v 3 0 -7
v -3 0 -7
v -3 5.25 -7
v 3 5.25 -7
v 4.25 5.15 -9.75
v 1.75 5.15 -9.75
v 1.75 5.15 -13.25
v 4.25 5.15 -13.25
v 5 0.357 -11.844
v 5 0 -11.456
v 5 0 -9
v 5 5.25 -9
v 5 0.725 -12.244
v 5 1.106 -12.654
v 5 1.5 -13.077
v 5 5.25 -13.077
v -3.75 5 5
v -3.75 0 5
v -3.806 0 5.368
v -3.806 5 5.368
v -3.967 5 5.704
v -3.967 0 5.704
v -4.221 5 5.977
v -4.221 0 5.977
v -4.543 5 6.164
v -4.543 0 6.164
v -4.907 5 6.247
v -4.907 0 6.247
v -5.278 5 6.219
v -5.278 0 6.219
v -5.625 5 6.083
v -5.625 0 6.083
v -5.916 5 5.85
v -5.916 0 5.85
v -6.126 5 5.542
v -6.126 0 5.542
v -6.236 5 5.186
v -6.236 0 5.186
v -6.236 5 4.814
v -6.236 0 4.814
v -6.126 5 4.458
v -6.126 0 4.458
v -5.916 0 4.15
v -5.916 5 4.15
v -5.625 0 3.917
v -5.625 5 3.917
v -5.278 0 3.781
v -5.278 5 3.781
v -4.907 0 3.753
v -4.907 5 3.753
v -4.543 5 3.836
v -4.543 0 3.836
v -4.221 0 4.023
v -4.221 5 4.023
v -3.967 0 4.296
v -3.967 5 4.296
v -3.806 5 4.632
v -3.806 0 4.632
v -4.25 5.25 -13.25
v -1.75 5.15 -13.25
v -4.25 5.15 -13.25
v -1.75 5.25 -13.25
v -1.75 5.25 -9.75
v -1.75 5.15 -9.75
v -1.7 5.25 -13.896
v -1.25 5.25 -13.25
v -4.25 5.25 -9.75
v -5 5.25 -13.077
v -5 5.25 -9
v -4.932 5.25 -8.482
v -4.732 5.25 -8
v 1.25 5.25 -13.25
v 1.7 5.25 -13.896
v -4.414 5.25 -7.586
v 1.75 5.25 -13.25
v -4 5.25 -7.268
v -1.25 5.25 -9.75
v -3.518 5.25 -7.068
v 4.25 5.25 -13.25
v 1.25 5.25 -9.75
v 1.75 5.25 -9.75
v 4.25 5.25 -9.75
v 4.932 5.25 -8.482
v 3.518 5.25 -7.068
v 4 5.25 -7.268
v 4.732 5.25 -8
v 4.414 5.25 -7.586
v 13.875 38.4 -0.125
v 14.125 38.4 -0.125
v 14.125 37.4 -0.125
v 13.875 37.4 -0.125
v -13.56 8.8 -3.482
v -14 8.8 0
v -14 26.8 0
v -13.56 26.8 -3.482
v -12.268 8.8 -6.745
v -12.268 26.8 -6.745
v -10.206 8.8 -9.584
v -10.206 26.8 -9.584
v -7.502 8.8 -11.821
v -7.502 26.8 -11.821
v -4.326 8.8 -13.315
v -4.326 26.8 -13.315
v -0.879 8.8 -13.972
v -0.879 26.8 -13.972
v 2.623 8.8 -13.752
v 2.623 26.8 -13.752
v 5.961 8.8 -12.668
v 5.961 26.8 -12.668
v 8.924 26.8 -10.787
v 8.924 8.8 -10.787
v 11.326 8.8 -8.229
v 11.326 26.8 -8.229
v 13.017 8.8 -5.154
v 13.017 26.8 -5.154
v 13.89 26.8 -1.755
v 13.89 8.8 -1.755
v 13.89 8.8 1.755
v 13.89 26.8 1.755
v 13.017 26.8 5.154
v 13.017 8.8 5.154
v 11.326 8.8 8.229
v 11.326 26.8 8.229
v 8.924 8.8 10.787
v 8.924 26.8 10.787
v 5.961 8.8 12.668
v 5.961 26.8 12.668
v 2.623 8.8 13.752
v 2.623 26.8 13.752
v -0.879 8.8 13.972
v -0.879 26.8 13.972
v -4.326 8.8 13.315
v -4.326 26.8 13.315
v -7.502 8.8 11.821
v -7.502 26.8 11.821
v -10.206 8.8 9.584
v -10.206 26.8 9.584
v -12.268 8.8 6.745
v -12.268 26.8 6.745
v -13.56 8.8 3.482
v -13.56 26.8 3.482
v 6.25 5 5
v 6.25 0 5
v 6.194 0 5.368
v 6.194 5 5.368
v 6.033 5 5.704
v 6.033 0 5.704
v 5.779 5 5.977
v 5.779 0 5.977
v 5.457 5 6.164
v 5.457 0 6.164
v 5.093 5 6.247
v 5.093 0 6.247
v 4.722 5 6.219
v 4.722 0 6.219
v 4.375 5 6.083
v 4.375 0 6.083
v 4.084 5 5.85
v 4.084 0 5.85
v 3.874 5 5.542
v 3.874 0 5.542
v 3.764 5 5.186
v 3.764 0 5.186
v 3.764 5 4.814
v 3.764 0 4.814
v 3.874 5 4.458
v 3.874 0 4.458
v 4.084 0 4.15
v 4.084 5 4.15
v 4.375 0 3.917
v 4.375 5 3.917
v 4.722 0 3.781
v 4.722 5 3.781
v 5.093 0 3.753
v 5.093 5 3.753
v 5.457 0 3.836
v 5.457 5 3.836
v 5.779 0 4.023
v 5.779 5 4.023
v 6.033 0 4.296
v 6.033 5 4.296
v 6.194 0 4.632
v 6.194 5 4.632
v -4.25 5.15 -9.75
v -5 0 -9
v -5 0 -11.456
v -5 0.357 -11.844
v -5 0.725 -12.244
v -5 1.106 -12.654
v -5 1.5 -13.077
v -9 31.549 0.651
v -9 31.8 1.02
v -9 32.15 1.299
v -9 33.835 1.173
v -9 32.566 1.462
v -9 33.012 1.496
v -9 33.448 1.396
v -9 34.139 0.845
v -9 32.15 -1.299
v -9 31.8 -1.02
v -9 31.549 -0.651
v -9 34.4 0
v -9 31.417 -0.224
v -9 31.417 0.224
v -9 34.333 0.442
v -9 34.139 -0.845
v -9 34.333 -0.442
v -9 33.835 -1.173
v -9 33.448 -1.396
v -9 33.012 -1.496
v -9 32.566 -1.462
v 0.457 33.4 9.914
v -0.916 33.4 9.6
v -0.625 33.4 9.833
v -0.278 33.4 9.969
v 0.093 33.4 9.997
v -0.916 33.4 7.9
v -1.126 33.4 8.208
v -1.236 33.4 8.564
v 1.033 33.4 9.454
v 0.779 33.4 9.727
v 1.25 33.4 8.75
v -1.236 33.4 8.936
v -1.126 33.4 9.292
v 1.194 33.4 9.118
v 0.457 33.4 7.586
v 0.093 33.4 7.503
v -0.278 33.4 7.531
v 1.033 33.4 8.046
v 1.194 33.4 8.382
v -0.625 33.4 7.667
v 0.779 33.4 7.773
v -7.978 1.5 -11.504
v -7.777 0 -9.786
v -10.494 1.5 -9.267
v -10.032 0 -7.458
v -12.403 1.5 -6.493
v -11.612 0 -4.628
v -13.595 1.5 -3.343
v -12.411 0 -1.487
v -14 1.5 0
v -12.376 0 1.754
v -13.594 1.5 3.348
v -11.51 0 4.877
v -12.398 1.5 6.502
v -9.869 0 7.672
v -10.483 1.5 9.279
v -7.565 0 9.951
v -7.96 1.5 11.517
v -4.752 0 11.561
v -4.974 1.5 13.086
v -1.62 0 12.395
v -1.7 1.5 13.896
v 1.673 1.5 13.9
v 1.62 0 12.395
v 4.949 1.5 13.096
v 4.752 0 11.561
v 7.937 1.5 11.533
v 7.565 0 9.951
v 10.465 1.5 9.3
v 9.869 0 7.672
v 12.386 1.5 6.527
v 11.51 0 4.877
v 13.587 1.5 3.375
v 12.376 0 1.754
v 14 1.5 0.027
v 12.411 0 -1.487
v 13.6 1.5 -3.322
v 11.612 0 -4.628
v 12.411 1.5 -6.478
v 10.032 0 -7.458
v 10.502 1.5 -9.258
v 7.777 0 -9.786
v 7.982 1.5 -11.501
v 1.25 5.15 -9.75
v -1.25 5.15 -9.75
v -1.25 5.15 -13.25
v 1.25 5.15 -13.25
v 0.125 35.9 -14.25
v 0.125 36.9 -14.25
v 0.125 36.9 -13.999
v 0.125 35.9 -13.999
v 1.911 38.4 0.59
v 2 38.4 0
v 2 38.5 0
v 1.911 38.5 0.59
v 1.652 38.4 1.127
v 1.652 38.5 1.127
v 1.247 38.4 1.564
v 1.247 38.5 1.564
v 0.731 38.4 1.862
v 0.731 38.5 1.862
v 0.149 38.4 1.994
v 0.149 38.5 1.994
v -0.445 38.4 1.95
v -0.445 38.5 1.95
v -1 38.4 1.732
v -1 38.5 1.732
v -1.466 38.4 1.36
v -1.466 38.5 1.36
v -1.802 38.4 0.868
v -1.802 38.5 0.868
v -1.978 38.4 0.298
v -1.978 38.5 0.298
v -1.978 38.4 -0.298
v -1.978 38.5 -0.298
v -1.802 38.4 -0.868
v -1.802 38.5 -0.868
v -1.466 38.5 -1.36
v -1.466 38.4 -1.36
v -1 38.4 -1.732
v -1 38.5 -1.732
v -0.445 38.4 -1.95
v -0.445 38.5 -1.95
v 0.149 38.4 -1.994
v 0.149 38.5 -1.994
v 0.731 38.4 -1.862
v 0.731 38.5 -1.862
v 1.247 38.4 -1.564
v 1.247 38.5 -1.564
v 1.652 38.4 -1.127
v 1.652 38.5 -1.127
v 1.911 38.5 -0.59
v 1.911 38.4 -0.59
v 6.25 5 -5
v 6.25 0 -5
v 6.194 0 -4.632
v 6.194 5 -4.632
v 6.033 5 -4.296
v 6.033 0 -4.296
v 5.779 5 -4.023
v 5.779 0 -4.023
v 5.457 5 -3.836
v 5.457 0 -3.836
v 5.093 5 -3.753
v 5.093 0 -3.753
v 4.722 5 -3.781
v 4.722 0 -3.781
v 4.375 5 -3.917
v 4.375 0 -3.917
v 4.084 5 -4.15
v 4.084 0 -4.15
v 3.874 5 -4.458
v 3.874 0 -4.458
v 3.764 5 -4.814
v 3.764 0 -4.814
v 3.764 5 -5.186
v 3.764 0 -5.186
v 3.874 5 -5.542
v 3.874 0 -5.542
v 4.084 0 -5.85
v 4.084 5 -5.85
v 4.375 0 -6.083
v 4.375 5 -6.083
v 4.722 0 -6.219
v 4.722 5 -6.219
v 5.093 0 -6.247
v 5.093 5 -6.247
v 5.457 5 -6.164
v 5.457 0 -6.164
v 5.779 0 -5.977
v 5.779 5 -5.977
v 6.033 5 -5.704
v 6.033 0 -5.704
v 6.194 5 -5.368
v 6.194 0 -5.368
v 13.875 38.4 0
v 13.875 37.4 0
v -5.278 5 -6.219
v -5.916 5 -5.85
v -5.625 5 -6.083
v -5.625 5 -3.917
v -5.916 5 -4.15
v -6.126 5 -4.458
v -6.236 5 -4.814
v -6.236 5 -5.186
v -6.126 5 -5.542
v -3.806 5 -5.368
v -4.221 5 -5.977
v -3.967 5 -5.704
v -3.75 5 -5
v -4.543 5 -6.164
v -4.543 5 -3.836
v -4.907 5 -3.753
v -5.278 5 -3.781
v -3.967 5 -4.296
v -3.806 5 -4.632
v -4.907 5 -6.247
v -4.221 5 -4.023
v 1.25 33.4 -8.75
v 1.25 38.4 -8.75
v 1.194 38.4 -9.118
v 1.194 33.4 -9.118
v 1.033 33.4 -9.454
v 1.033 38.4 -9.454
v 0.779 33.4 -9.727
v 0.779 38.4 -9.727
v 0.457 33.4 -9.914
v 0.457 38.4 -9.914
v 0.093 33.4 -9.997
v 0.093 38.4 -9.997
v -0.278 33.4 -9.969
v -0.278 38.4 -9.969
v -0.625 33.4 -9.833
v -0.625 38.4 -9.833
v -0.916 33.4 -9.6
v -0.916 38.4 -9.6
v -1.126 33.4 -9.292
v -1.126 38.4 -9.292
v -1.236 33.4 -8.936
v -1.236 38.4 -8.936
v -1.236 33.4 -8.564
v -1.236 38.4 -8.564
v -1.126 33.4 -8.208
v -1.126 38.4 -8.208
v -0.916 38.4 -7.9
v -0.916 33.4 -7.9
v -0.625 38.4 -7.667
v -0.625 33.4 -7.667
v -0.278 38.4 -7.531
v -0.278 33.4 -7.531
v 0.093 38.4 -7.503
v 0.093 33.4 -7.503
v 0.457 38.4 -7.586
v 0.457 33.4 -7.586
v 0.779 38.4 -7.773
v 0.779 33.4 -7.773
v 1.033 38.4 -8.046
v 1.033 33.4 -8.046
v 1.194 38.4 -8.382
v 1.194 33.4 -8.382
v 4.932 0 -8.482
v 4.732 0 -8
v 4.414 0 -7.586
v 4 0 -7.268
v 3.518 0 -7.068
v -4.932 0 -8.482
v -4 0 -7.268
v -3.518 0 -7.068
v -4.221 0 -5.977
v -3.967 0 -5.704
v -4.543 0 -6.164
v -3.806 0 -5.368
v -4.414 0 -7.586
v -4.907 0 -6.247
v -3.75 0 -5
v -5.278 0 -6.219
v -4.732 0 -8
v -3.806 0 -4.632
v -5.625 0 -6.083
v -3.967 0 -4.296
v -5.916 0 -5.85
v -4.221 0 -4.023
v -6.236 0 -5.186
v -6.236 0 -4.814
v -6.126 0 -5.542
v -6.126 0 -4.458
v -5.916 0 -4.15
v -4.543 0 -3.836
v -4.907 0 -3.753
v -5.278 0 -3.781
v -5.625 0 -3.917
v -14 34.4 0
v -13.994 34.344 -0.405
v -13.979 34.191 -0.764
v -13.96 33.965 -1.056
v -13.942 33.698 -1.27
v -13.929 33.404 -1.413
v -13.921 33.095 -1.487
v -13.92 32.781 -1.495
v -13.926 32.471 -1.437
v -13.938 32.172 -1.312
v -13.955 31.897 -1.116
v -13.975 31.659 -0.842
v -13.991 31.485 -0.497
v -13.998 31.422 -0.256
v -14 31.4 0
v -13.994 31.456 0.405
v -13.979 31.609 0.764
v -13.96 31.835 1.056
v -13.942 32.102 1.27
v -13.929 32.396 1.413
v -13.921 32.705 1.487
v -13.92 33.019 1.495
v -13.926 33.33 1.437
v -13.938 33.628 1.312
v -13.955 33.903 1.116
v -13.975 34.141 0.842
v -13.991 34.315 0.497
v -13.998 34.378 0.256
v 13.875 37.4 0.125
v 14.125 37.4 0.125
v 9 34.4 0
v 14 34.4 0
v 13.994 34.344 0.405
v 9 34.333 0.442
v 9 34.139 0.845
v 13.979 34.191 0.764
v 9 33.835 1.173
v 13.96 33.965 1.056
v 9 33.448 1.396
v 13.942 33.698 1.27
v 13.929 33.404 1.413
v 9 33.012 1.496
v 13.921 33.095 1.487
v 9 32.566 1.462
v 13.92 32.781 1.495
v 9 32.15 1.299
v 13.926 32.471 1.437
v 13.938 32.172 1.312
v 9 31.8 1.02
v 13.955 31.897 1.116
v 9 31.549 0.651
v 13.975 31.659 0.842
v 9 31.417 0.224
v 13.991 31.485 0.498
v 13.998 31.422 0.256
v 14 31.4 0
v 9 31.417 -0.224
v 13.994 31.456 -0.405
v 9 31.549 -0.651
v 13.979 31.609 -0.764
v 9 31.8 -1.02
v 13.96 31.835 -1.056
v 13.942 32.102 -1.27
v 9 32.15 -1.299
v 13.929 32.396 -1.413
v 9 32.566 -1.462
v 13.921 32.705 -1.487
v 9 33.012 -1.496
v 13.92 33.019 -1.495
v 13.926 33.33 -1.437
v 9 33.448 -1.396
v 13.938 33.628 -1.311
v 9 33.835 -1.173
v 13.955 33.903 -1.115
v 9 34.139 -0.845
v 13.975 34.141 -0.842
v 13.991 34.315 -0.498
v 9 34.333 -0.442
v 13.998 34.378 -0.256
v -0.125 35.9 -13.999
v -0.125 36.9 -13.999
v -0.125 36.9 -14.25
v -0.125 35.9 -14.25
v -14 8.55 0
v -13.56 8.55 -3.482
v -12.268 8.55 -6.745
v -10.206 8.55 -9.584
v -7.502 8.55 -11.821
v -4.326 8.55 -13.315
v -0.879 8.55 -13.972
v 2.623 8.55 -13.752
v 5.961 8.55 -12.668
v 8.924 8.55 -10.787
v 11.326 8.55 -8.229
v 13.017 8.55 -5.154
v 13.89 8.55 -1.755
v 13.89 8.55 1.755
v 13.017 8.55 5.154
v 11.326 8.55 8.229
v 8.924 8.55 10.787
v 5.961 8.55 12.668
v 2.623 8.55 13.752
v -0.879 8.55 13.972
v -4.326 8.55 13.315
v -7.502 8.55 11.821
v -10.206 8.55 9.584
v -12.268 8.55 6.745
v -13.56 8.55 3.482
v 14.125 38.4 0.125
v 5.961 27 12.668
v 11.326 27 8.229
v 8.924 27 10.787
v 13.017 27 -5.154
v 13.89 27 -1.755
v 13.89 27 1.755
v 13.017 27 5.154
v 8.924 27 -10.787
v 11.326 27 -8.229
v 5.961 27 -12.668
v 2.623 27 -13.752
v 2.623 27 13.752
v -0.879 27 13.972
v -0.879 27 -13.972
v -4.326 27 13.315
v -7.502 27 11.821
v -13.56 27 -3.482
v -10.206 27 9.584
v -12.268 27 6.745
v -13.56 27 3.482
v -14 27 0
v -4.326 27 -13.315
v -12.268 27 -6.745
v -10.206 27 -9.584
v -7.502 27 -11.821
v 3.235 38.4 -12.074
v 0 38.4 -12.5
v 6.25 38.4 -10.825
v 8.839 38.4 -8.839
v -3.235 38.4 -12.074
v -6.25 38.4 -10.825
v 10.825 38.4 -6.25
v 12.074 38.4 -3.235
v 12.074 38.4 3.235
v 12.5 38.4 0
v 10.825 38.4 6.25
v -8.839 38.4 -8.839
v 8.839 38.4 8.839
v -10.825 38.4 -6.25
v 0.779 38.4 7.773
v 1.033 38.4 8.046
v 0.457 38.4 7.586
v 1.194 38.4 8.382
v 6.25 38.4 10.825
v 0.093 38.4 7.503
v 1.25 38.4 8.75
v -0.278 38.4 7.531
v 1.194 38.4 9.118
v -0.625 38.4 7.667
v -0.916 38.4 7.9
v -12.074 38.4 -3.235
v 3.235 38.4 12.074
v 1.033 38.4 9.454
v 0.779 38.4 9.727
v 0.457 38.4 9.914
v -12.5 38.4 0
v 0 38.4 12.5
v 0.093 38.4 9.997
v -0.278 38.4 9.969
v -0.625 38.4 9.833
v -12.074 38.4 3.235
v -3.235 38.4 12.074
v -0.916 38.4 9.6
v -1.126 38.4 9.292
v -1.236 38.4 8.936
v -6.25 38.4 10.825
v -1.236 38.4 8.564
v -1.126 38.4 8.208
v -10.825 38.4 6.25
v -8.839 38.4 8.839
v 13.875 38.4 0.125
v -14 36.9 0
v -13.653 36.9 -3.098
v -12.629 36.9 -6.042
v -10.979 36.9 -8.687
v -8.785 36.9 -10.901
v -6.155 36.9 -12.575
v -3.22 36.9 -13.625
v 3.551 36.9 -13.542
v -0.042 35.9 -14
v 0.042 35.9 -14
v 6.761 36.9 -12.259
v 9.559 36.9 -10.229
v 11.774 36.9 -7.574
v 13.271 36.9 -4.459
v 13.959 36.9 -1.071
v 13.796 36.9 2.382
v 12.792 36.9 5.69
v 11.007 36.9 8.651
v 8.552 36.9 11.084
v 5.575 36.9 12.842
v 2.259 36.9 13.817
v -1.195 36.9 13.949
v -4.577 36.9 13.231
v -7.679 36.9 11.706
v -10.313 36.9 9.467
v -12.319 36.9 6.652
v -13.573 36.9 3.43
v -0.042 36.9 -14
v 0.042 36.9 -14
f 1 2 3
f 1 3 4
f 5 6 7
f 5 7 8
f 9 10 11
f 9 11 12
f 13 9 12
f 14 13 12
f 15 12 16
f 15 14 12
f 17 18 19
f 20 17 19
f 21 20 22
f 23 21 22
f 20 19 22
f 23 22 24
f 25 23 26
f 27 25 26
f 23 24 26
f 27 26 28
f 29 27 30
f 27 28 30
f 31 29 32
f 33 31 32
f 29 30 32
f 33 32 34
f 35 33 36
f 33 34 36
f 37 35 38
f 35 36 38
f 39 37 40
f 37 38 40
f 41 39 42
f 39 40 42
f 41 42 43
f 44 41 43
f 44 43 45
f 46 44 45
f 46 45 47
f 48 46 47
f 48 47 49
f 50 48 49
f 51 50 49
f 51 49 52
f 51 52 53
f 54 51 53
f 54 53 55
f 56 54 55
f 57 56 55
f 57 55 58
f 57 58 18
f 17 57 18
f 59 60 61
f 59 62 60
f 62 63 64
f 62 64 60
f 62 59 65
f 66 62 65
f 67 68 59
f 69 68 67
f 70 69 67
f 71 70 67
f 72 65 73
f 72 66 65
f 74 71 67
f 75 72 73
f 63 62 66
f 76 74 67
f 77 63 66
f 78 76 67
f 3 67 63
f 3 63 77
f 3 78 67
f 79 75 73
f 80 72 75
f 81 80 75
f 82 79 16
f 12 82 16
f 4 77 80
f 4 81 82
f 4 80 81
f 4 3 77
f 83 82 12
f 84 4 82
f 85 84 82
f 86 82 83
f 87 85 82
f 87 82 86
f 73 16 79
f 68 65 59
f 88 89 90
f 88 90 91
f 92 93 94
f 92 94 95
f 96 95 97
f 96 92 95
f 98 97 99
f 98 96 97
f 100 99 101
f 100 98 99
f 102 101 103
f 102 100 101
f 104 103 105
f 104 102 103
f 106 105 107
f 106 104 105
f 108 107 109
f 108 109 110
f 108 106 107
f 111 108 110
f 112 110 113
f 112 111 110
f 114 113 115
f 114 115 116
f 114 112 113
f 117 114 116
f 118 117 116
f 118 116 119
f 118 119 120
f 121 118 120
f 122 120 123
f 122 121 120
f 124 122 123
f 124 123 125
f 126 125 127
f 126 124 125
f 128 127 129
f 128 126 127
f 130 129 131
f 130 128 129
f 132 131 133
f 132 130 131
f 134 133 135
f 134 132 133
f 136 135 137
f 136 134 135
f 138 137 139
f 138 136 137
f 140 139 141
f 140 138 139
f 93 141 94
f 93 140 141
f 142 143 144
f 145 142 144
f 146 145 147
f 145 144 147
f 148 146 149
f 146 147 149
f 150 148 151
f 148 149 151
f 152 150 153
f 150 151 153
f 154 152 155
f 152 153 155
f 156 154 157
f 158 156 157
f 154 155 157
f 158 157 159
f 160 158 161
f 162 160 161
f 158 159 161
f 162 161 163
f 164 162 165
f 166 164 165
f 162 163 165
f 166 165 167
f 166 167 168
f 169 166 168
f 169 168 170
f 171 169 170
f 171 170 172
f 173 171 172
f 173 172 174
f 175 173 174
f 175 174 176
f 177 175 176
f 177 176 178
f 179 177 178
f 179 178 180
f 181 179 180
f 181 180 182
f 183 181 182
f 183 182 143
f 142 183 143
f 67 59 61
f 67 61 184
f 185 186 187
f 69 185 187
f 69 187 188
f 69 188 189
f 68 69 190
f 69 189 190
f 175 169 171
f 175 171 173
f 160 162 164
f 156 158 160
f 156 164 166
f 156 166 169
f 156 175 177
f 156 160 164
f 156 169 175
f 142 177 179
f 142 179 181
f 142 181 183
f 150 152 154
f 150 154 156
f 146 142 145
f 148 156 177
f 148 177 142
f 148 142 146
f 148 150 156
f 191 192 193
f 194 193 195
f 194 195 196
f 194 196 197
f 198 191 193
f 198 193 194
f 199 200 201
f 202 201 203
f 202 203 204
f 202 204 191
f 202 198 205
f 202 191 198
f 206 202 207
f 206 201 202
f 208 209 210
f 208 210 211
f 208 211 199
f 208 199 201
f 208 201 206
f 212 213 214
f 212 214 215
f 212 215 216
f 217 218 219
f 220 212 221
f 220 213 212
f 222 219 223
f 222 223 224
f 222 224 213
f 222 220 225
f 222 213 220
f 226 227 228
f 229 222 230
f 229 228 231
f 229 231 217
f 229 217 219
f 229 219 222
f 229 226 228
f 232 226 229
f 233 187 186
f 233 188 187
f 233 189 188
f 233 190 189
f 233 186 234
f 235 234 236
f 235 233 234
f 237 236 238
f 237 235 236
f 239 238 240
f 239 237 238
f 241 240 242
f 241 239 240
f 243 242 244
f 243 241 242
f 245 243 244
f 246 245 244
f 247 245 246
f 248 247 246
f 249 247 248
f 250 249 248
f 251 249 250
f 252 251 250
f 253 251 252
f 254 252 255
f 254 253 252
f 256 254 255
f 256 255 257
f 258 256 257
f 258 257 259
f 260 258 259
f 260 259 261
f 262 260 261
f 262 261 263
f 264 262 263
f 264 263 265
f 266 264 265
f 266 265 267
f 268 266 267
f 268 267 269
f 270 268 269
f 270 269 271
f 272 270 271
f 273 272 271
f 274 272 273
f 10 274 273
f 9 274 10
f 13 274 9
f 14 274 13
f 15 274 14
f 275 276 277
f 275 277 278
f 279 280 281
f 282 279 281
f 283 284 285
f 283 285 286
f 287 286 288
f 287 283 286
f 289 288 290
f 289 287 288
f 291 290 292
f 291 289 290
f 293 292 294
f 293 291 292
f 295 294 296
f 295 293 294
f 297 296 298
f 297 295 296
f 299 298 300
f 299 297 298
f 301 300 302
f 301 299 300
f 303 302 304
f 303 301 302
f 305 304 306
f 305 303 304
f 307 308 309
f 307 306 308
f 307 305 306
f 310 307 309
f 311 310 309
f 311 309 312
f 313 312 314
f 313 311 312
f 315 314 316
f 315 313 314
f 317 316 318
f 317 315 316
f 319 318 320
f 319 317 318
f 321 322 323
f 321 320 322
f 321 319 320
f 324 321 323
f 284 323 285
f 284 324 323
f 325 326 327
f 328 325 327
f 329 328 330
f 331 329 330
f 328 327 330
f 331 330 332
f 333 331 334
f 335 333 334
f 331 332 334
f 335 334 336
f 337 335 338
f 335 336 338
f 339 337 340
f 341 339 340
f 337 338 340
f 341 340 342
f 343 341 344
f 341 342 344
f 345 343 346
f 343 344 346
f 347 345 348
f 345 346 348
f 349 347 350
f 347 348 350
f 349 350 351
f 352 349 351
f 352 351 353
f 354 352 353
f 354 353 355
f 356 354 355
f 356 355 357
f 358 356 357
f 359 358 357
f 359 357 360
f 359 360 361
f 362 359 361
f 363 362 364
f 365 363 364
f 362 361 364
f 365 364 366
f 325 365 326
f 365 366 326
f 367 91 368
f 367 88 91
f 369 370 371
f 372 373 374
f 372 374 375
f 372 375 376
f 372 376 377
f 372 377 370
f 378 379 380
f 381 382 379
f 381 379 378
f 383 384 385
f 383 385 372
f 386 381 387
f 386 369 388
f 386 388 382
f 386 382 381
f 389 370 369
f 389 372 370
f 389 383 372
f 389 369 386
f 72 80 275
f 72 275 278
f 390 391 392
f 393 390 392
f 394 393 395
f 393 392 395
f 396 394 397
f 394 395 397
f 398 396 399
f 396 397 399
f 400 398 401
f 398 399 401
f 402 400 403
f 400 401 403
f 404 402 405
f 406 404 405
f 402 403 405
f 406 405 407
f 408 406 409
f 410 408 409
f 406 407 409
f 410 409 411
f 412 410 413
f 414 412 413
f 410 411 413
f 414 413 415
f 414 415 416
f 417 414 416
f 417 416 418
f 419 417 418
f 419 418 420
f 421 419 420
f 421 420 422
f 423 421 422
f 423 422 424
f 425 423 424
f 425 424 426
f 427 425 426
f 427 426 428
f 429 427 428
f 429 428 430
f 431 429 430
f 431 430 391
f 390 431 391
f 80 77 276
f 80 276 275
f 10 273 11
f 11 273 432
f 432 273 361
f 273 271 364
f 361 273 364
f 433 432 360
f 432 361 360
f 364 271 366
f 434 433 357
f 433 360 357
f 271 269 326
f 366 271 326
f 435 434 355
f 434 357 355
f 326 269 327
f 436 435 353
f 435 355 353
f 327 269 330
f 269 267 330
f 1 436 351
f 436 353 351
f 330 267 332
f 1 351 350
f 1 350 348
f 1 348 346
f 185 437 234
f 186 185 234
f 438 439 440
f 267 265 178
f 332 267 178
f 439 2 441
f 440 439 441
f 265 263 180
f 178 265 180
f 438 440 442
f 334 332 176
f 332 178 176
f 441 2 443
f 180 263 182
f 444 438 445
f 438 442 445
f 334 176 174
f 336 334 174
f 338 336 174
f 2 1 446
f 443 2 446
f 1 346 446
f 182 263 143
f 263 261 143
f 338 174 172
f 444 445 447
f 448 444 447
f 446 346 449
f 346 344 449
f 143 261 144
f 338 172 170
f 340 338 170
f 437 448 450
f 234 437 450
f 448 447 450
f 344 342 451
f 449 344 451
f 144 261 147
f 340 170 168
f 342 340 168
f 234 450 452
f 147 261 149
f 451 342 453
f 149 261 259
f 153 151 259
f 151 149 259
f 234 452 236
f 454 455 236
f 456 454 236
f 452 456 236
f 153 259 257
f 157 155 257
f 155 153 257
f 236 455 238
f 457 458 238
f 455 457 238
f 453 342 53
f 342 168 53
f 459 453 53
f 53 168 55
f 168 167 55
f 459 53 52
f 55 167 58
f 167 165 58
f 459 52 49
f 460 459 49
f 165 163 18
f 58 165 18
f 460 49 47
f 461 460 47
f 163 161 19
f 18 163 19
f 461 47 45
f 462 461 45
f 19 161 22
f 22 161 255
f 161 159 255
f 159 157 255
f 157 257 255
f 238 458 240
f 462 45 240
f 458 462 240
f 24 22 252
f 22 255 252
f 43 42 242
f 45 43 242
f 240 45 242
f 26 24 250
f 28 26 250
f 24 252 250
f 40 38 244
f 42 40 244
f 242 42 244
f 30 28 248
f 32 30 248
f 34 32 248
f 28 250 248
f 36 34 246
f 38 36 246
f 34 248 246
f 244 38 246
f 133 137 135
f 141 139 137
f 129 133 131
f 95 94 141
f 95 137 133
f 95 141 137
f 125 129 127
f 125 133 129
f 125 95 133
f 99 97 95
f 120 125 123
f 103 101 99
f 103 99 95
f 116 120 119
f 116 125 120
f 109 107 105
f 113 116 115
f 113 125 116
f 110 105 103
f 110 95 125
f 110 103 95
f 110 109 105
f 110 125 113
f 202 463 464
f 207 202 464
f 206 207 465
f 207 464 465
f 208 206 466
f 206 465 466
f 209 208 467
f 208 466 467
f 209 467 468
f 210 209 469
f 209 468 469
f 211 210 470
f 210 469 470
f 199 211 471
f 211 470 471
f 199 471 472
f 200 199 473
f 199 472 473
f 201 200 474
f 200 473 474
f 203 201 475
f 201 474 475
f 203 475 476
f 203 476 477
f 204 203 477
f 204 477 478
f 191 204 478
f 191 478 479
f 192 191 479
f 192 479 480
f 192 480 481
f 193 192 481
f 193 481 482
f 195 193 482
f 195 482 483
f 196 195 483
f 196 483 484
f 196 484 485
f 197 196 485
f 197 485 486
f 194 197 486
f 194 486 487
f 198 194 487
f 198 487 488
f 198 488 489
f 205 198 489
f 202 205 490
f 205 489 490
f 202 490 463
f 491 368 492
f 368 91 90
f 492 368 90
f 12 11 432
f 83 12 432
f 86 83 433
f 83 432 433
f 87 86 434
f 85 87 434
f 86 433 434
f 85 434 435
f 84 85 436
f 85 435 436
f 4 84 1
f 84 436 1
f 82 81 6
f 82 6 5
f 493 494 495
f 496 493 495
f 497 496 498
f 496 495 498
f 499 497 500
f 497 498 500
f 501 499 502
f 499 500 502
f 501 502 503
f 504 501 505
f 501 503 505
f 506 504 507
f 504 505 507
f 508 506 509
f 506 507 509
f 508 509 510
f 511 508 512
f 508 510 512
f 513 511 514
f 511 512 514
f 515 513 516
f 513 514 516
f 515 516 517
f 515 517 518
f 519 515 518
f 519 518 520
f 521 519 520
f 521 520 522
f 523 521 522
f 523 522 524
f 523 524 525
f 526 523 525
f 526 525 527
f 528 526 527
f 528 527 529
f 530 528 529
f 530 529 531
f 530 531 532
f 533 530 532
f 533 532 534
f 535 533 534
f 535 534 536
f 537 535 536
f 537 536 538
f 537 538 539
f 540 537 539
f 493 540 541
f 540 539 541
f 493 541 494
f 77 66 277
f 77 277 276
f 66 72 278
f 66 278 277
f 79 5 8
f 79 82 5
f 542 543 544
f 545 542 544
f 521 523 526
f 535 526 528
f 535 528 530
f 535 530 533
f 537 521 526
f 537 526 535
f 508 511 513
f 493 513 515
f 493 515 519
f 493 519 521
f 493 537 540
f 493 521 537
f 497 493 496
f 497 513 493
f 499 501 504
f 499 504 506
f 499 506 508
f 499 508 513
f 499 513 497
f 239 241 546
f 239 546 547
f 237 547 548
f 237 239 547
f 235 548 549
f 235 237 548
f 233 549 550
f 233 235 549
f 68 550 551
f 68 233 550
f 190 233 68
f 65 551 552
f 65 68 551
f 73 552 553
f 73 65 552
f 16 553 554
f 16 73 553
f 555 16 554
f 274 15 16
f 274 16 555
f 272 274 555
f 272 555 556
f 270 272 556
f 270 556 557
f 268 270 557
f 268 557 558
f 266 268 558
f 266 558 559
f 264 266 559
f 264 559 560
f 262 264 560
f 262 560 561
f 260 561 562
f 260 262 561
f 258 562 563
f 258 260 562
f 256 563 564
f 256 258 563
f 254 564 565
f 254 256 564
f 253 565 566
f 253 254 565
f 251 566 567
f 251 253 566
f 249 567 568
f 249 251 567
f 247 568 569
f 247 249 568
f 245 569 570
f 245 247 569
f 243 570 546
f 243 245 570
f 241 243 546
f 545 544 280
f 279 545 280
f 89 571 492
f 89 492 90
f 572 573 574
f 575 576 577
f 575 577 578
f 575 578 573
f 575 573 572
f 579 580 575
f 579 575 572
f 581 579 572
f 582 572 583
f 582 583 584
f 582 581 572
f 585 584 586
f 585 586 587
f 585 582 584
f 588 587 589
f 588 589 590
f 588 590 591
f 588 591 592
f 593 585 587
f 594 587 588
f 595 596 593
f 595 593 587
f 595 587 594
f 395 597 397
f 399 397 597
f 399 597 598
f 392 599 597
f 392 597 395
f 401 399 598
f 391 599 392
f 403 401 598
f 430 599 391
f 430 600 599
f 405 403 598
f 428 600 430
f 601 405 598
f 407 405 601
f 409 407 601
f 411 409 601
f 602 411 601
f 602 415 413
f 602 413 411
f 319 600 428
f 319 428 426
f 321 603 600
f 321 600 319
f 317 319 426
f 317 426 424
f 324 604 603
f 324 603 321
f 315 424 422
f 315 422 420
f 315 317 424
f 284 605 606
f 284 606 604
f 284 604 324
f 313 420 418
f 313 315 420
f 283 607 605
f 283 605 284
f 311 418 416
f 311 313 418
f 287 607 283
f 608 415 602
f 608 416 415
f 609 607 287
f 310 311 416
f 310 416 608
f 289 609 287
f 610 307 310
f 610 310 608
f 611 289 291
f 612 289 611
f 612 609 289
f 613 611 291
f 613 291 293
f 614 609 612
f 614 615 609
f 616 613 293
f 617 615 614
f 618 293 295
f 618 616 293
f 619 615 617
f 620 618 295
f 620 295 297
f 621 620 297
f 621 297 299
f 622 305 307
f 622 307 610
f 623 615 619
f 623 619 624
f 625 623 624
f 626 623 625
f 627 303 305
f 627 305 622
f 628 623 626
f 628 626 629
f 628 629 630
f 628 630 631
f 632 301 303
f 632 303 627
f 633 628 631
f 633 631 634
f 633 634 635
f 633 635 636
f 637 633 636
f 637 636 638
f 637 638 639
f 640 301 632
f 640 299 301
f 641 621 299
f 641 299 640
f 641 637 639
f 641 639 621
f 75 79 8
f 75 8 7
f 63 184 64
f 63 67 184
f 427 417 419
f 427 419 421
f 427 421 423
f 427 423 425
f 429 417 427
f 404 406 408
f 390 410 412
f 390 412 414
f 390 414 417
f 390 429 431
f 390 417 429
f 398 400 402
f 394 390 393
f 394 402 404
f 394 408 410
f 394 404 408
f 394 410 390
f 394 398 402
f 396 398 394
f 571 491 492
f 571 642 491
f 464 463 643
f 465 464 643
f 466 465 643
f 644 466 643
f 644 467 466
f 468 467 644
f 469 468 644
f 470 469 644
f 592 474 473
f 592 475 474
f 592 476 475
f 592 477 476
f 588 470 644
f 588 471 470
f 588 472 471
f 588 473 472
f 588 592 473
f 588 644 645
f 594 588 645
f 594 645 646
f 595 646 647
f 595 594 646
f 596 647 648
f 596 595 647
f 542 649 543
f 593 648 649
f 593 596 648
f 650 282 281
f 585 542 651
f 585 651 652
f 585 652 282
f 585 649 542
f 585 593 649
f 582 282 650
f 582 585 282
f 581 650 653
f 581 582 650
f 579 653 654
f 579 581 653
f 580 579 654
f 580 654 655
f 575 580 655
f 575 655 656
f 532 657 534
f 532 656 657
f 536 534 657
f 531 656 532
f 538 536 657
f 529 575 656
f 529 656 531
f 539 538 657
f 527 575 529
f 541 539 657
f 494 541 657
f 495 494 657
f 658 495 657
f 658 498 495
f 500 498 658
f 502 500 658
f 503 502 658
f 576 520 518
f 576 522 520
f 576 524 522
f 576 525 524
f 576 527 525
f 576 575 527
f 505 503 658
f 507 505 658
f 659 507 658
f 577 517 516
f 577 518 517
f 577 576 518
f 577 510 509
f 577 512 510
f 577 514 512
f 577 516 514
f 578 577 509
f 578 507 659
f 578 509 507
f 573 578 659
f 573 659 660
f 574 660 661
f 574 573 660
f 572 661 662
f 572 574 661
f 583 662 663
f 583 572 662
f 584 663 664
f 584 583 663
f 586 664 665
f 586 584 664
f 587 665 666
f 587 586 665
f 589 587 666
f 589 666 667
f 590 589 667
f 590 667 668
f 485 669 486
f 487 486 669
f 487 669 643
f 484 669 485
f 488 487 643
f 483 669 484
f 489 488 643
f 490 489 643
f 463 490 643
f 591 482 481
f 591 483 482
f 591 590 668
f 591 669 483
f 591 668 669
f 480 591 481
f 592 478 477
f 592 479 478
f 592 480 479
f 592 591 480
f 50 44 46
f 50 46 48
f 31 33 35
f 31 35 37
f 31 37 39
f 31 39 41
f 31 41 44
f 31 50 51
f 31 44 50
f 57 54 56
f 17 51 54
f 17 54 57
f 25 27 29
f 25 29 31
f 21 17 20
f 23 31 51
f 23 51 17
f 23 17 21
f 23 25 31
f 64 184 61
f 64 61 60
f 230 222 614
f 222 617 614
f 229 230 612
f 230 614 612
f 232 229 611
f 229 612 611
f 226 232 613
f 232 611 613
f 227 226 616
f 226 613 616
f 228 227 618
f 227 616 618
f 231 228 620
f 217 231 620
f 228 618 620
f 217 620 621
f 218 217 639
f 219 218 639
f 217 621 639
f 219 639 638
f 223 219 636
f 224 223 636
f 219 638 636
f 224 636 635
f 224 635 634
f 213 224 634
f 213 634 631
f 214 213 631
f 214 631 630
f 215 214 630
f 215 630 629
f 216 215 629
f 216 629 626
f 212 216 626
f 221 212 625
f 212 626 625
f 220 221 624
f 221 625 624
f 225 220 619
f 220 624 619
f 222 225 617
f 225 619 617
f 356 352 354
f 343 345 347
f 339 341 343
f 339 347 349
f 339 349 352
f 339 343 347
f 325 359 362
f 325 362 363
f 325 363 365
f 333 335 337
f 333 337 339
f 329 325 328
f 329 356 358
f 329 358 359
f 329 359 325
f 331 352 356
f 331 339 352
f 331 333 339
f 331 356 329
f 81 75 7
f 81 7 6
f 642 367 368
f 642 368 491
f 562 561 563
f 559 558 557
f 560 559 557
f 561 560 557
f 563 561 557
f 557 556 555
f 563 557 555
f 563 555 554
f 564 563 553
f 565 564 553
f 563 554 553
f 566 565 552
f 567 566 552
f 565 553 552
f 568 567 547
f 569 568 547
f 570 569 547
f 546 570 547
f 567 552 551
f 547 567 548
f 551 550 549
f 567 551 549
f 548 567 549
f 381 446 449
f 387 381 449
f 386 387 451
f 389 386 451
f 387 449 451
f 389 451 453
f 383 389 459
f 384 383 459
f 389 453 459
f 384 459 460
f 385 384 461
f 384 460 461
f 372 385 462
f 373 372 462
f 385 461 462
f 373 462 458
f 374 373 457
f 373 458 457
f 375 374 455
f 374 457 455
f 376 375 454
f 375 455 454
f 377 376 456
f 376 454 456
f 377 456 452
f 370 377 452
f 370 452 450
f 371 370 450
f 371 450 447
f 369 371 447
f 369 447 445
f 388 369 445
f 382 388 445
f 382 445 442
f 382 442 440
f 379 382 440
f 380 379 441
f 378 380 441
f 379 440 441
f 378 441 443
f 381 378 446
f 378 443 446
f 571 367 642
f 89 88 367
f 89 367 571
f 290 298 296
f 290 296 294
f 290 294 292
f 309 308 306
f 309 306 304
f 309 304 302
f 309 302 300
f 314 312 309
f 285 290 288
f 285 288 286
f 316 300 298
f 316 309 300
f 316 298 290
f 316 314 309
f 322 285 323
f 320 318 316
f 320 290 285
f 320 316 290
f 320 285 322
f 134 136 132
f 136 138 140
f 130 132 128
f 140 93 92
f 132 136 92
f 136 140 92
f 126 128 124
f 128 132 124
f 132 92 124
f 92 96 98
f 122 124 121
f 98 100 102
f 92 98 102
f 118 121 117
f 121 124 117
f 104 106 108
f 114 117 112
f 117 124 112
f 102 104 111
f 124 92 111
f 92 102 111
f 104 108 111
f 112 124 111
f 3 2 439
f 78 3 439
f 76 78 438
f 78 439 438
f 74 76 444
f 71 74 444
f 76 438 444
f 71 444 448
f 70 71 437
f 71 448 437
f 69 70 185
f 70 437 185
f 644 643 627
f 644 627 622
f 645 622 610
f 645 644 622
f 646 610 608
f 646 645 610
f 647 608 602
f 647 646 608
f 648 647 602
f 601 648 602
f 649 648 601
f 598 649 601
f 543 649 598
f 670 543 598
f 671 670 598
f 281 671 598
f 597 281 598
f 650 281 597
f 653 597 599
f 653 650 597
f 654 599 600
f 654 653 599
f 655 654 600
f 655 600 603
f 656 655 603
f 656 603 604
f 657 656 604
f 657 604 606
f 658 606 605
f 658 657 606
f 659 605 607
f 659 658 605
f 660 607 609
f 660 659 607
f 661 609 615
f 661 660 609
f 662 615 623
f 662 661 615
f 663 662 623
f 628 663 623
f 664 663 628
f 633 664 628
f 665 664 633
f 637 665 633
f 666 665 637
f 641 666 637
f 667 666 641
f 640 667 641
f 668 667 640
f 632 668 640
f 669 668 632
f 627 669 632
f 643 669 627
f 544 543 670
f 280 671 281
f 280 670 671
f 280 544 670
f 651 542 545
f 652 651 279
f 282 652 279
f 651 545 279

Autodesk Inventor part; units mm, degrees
sketch "Sketch1" plane through (0, 0, 0) normal (0, 1, 0) x (-1, 0, 0)
  circle A0 centre (0, 0) radius 14
  dimension "d0" = 28
extrude "Extrusion1" add sketch "Sketch1" along normal blind 38.4
chamfer "Chamfer1" distance 1.5 angle 45 2 edges at (14, 38.4, 0) (14, 0, 0)
sketch "Sketch2" plane through (0, 38.4, 0) normal (0, 1, 0) x (1, 0, 0)
  circle A0 centre (0, 0) radius 2
  dimension "d6" = 4
extrude "Extrusion2" add sketch "Sketch2" along normal blind 0.1
sketch "Sketch3" plane through (0, 38.4, 0) normal (0, 1, 0) x (1, 0, 0)
  line L0 (0, 0) -> (0, 8.75)
  circle A0 centre (0, 8.75) radius 1.25
  line L1 (0, 0) -> (0, -8.75)
  line L2 (0, 0) -> (8.75, 0) construction
  circle A1 centre (0, -8.75) radius 1.25
  dimension "d9" = 8.75
  dimension "d10" = 2.5
  dimension "d11" = 8.75
  dimension "d12" = 90
  dimension "d13" = 2.5
extrude "Extrusion4" cut sketch "Sketch3" against normal blind 5
thread "Thread1" size "M2.5x0.45" class "6H" standard "ANSI Metric M Profile" full length
thread "Thread2" size "M2.5x0.45" class "6H" standard "ANSI Metric M Profile" full length
ref_plane "Work Plane1" through (0, 36.9, 0) normal (0, 1, 0) x (1, 0, 0)
sketch "Sketch6" plane through (0, 36.9, 0) normal (0, 1, 0) x (1, 0, 0)
  line L0 (0.125, 13.75) -> (-0.125, 13.75)
  line L1 (-0.125, 13.75) -> (-0.125, 14.25)
  line L2 (-0.125, 14.25) -> (0.125, 14.25)
  line L3 (0.125, 14.25) -> (0.125, 13.75)
  circle A0 centre (0, 0) radius 14 projected
  line L4 (0.125, 13.75) -> (-0.125, 14.25) construction
  line L5 (-0.125, 13.75) -> (0.125, 14.25) construction
  point P0 (0, 14)
  dimension "d25" = 0.25
  dimension "d26" = 0.5
extrude "Extrusion5" add sketch "Sketch6" against normal blind 1 contours L0 L1 A0 L3 | A0 L1 L2 L3 picked at (-0.0139, 13.8333)
ref_plane "Work Plane2" through (-0.125, 0, -13.9994) normal (-0.0089, 0, -1) x (-1, 0, 0.0089)
sketch "Sketch7" plane through (-0.125, 0, -13.9994) normal (-0.0089, 0, -1) x (-1, 0, 0.0089)
  line L0 (0, 36.9) -> (0, 26.9)
  line L1 (0, 36.9) -> (0, 35.9) projected
  line L2 (0, 36.9) -> (10, 36.9) construction
  line L3 (-87.9645, 27) -> (87.9645, 27)
  line L4 (87.9645, 27) -> (87.9645, 26.8)
  line L5 (87.9645, 26.8) -> (-87.9645, 26.8)
  line L6 (-87.9645, 26.8) -> (-87.9645, 27)
  line L7 (-87.9645, 27) -> (87.9645, 26.8) construction
  line L8 (87.9645, 27) -> (-87.9645, 26.8) construction
  line L9 (0, 26.8) -> (0, 8.8)
  line L10 (0, 26.8) -> (18, 26.8) construction
  line L11 (0, 8.8) -> (0, 8.675)
  line L12 (0, 8.8) -> (0.125, 8.8) construction
  line L13 (-87.9645, 8.55) -> (87.9645, 8.55)
  line L14 (87.9645, 8.55) -> (87.9645, 8.8)
  line L15 (87.9645, 8.8) -> (-87.9645, 8.8)
  line L16 (-87.9645, 8.8) -> (-87.9645, 8.55)
  line L17 (-87.9645, 8.55) -> (87.9645, 8.8) construction
  line L18 (87.9645, 8.55) -> (-87.9645, 8.8) construction
  point P0 (0, 0)
  dimension "d29" = 10
  dimension "d30" = 90
  dimension "d31" = 175.929
  dimension "d32" = 0.2
  dimension "d33" = 18
  dimension "d34" = 90
  dimension "d35" = 0.125
  dimension "d36" = 90
  dimension "d37" = 175.929
  dimension "d38" = 0.25
sketch3d "3D Sketch1"
extrude "Extrusion6" cut sketch "Sketch7" against normal blind 28
sketch "Sketch8" plane through (0, 38.4, 0) normal (0, 1, 0) x (1, 0, 0)
  line L0 (0, 0) -> (14, 0)
  line L1 (14.125, 0.125) -> (13.875, 0.125)
  line L2 (13.875, 0.125) -> (13.875, -0.125)
  line L3 (13.875, -0.125) -> (14.125, -0.125)
  line L4 (14.125, -0.125) -> (14.125, 0.125)
  line L5 (14.125, 0.125) -> (13.875, -0.125) construction
  line L6 (13.875, 0.125) -> (14.125, -0.125) construction
  dimension "d41" = 14
  dimension "d42" = 0.25
  dimension "d43" = 0.25
extrude "Extrusion7" add sketch "Sketch8" against normal blind 1
ref_plane "Work Plane3" through (14, 0, 0) normal (1, 0, 0) x (0, 1, 0)
sketch "Sketch9" plane through (14, 0, 0) normal (1, 0, 0) x (0, 1, 0)
  line L0 (38.4, 0.125) -> (38.4, -0.125) projected
  line L1 (38.4, -0.125) -> (38.4, 0)
  line L2 (38.4, 0) -> (32.9, 0)
  line L3 (38.4, 0) -> (43.9, 0) construction
  circle A0 centre (32.9, 0) radius 1.5
  point P0 (0, 0)
  dimension "d46" = 5.5
  dimension "d47" = 180
  dimension "d48" = 3
extrude "Extrusion8" cut sketch "Sketch9" against normal blind 5
thread "Thread3" size "M3x0.5" class "6H" standard "ANSI Metric M Profile" full length
pattern_circular "Circular Pattern1" count 2 over 360 about axis through (0, 0, 0) along (0, 1, 0) of "Extrusion8"
thread "Thread4" size "M3x0.5" class "6H" standard "ANSI Metric M Profile" full length
sketch "Sketch10" plane through (0, 0, 0) normal (0, -1, 0) x (1, 0, 0)
  line L0 (0, 0) -> (5, 0)
  line L1 (13.9194, -1.5) -> (9, -1.5) projected
  line L2 (0, 0) -> (5, 0) construction
  line L3 (5, 0) -> (5, 5)
  line L4 (5, 0) -> (10, 0) construction
  circle A0 centre (5, 5) radius 1.25
  circle A1 centre (5, -5) radius 1.25
  circle A2 centre (-5, 5) radius 1.25
  circle A3 centre (-5, -5) radius 1.25
  dimension "d58" = 5
  dimension "d59" = 0
  dimension "d60" = 5
  dimension "d61" = 90
  dimension "d62" = 2.5
  dimension "d65" = 10
  dimension "d68" = 10
extrude "Extrusion9" cut sketch "Sketch10" against normal blind 5
thread "Thread5" size "M2.5x0.45" class "6H" standard "ANSI Metric M Profile" full length
thread "Thread6" size "M2.5x0.45" class "6H" standard "ANSI Metric M Profile" full length
thread "Thread7" size "M2.5x0.45" class "6H" standard "ANSI Metric M Profile" full length
thread "Thread8" size "M2.5x0.45" class "6H" standard "ANSI Metric M Profile" full length
sketch "Sketch11" plane through (0, 0, 0) normal (0, -1, 0) x (1, 0, 0)
  line L0 (0, 0) -> (0, -7)
  line L1 (0, 0) -> (7, 0) construction
  line L2 (-5, -14) -> (5, -14)
  line L3 (-3, -7) -> (-3, -9)
  line L4 (-3, -7) -> (-1, -7) construction
  line L5 (-3, -9) -> (-5, -9) construction
  line L6 (-3, -9) -> (-3, -7) construction
  line L7 (-3, -9) -> (-5, -9)
  line L8 (3, -9) -> (3, -7)
  line L9 (3, -9) -> (5, -9)
  arc A0 (-3, -7) -> (-5, -9) centre (-3, -9) ccw
  arc A1 (5, -9) -> (3, -7) centre (3, -9) ccw
  line L10 (-3, -7) -> (3, -7)
  line L11 (-5, -9) -> (-5, -14)
  line L12 (5, -9) -> (5, -14)
  dimension "d81" = 7
  dimension "d82" = 90
  dimension "d87" = 2
  dimension "d88" = 90
  dimension "d89" = 90
  dimension "d90" = 6
  dimension "d91" = 5
  dimension "d92" = 10
  dimension "d93" = 7
extrude "Extrusion10" cut sketch "Sketch11" against normal blind 5.25
sketch "Sketch12" plane through (0, 5.25, 0) normal (0, -1, 0) x (1, 0, 0)
  line L0 (-3, -7) -> (3, -7) projected
  line L1 (0, -7) -> (0, -9)
  line L2 (0, -9) -> (0, -11.5)
  line L3 (0.125, -14.25) -> (0.125, -13.9994) projected
  line L4 (0, -9) -> (2.5, -9) construction
  line L5 (1.25, -13.25) -> (-1.25, -13.25)
  line L6 (-1.25, -13.25) -> (-1.25, -9.75)
  line L7 (-1.25, -9.75) -> (1.25, -9.75)
  line L8 (1.25, -9.75) -> (1.25, -13.25)
  line L9 (1.25, -13.25) -> (-1.25, -9.75) construction
  line L10 (-1.25, -13.25) -> (1.25, -9.75) construction
  line L11 (0, -11.5) -> (-3, -11.5)
  line L12 (-1.75, -13.25) -> (-4.25, -13.25)
  line L13 (-4.25, -13.25) -> (-4.25, -9.75)
  line L14 (-4.25, -9.75) -> (-1.75, -9.75)
  line L15 (-1.75, -9.75) -> (-1.75, -13.25)
  line L16 (-1.75, -13.25) -> (-4.25, -9.75) construction
  line L17 (-4.25, -13.25) -> (-1.75, -9.75) construction
  line L18 (0, -11.5) -> (3, -11.5)
  line L19 (4.25, -13.25) -> (1.75, -13.25)
  line L20 (1.75, -13.25) -> (1.75, -9.75)
  line L21 (1.75, -9.75) -> (4.25, -9.75)
  line L22 (4.25, -9.75) -> (4.25, -13.25)
  line L23 (4.25, -13.25) -> (1.75, -9.75) construction
  line L24 (1.75, -13.25) -> (4.25, -9.75) construction
  point P0 (0, 0)
  dimension "d96" = 2
  dimension "d97" = 2.5
  dimension "d98" = 90
  dimension "d99" = 2.5
  dimension "d100" = 3.5
  dimension "d101" = 3
  dimension "d102" = 2.5
  dimension "d103" = 3.5
  dimension "d104" = 3
  dimension "d105" = 2.5
  dimension "d106" = 3.5
extrude "Extrusion11" add sketch "Sketch12" along normal blind 0.1
properties part number "Motor"
